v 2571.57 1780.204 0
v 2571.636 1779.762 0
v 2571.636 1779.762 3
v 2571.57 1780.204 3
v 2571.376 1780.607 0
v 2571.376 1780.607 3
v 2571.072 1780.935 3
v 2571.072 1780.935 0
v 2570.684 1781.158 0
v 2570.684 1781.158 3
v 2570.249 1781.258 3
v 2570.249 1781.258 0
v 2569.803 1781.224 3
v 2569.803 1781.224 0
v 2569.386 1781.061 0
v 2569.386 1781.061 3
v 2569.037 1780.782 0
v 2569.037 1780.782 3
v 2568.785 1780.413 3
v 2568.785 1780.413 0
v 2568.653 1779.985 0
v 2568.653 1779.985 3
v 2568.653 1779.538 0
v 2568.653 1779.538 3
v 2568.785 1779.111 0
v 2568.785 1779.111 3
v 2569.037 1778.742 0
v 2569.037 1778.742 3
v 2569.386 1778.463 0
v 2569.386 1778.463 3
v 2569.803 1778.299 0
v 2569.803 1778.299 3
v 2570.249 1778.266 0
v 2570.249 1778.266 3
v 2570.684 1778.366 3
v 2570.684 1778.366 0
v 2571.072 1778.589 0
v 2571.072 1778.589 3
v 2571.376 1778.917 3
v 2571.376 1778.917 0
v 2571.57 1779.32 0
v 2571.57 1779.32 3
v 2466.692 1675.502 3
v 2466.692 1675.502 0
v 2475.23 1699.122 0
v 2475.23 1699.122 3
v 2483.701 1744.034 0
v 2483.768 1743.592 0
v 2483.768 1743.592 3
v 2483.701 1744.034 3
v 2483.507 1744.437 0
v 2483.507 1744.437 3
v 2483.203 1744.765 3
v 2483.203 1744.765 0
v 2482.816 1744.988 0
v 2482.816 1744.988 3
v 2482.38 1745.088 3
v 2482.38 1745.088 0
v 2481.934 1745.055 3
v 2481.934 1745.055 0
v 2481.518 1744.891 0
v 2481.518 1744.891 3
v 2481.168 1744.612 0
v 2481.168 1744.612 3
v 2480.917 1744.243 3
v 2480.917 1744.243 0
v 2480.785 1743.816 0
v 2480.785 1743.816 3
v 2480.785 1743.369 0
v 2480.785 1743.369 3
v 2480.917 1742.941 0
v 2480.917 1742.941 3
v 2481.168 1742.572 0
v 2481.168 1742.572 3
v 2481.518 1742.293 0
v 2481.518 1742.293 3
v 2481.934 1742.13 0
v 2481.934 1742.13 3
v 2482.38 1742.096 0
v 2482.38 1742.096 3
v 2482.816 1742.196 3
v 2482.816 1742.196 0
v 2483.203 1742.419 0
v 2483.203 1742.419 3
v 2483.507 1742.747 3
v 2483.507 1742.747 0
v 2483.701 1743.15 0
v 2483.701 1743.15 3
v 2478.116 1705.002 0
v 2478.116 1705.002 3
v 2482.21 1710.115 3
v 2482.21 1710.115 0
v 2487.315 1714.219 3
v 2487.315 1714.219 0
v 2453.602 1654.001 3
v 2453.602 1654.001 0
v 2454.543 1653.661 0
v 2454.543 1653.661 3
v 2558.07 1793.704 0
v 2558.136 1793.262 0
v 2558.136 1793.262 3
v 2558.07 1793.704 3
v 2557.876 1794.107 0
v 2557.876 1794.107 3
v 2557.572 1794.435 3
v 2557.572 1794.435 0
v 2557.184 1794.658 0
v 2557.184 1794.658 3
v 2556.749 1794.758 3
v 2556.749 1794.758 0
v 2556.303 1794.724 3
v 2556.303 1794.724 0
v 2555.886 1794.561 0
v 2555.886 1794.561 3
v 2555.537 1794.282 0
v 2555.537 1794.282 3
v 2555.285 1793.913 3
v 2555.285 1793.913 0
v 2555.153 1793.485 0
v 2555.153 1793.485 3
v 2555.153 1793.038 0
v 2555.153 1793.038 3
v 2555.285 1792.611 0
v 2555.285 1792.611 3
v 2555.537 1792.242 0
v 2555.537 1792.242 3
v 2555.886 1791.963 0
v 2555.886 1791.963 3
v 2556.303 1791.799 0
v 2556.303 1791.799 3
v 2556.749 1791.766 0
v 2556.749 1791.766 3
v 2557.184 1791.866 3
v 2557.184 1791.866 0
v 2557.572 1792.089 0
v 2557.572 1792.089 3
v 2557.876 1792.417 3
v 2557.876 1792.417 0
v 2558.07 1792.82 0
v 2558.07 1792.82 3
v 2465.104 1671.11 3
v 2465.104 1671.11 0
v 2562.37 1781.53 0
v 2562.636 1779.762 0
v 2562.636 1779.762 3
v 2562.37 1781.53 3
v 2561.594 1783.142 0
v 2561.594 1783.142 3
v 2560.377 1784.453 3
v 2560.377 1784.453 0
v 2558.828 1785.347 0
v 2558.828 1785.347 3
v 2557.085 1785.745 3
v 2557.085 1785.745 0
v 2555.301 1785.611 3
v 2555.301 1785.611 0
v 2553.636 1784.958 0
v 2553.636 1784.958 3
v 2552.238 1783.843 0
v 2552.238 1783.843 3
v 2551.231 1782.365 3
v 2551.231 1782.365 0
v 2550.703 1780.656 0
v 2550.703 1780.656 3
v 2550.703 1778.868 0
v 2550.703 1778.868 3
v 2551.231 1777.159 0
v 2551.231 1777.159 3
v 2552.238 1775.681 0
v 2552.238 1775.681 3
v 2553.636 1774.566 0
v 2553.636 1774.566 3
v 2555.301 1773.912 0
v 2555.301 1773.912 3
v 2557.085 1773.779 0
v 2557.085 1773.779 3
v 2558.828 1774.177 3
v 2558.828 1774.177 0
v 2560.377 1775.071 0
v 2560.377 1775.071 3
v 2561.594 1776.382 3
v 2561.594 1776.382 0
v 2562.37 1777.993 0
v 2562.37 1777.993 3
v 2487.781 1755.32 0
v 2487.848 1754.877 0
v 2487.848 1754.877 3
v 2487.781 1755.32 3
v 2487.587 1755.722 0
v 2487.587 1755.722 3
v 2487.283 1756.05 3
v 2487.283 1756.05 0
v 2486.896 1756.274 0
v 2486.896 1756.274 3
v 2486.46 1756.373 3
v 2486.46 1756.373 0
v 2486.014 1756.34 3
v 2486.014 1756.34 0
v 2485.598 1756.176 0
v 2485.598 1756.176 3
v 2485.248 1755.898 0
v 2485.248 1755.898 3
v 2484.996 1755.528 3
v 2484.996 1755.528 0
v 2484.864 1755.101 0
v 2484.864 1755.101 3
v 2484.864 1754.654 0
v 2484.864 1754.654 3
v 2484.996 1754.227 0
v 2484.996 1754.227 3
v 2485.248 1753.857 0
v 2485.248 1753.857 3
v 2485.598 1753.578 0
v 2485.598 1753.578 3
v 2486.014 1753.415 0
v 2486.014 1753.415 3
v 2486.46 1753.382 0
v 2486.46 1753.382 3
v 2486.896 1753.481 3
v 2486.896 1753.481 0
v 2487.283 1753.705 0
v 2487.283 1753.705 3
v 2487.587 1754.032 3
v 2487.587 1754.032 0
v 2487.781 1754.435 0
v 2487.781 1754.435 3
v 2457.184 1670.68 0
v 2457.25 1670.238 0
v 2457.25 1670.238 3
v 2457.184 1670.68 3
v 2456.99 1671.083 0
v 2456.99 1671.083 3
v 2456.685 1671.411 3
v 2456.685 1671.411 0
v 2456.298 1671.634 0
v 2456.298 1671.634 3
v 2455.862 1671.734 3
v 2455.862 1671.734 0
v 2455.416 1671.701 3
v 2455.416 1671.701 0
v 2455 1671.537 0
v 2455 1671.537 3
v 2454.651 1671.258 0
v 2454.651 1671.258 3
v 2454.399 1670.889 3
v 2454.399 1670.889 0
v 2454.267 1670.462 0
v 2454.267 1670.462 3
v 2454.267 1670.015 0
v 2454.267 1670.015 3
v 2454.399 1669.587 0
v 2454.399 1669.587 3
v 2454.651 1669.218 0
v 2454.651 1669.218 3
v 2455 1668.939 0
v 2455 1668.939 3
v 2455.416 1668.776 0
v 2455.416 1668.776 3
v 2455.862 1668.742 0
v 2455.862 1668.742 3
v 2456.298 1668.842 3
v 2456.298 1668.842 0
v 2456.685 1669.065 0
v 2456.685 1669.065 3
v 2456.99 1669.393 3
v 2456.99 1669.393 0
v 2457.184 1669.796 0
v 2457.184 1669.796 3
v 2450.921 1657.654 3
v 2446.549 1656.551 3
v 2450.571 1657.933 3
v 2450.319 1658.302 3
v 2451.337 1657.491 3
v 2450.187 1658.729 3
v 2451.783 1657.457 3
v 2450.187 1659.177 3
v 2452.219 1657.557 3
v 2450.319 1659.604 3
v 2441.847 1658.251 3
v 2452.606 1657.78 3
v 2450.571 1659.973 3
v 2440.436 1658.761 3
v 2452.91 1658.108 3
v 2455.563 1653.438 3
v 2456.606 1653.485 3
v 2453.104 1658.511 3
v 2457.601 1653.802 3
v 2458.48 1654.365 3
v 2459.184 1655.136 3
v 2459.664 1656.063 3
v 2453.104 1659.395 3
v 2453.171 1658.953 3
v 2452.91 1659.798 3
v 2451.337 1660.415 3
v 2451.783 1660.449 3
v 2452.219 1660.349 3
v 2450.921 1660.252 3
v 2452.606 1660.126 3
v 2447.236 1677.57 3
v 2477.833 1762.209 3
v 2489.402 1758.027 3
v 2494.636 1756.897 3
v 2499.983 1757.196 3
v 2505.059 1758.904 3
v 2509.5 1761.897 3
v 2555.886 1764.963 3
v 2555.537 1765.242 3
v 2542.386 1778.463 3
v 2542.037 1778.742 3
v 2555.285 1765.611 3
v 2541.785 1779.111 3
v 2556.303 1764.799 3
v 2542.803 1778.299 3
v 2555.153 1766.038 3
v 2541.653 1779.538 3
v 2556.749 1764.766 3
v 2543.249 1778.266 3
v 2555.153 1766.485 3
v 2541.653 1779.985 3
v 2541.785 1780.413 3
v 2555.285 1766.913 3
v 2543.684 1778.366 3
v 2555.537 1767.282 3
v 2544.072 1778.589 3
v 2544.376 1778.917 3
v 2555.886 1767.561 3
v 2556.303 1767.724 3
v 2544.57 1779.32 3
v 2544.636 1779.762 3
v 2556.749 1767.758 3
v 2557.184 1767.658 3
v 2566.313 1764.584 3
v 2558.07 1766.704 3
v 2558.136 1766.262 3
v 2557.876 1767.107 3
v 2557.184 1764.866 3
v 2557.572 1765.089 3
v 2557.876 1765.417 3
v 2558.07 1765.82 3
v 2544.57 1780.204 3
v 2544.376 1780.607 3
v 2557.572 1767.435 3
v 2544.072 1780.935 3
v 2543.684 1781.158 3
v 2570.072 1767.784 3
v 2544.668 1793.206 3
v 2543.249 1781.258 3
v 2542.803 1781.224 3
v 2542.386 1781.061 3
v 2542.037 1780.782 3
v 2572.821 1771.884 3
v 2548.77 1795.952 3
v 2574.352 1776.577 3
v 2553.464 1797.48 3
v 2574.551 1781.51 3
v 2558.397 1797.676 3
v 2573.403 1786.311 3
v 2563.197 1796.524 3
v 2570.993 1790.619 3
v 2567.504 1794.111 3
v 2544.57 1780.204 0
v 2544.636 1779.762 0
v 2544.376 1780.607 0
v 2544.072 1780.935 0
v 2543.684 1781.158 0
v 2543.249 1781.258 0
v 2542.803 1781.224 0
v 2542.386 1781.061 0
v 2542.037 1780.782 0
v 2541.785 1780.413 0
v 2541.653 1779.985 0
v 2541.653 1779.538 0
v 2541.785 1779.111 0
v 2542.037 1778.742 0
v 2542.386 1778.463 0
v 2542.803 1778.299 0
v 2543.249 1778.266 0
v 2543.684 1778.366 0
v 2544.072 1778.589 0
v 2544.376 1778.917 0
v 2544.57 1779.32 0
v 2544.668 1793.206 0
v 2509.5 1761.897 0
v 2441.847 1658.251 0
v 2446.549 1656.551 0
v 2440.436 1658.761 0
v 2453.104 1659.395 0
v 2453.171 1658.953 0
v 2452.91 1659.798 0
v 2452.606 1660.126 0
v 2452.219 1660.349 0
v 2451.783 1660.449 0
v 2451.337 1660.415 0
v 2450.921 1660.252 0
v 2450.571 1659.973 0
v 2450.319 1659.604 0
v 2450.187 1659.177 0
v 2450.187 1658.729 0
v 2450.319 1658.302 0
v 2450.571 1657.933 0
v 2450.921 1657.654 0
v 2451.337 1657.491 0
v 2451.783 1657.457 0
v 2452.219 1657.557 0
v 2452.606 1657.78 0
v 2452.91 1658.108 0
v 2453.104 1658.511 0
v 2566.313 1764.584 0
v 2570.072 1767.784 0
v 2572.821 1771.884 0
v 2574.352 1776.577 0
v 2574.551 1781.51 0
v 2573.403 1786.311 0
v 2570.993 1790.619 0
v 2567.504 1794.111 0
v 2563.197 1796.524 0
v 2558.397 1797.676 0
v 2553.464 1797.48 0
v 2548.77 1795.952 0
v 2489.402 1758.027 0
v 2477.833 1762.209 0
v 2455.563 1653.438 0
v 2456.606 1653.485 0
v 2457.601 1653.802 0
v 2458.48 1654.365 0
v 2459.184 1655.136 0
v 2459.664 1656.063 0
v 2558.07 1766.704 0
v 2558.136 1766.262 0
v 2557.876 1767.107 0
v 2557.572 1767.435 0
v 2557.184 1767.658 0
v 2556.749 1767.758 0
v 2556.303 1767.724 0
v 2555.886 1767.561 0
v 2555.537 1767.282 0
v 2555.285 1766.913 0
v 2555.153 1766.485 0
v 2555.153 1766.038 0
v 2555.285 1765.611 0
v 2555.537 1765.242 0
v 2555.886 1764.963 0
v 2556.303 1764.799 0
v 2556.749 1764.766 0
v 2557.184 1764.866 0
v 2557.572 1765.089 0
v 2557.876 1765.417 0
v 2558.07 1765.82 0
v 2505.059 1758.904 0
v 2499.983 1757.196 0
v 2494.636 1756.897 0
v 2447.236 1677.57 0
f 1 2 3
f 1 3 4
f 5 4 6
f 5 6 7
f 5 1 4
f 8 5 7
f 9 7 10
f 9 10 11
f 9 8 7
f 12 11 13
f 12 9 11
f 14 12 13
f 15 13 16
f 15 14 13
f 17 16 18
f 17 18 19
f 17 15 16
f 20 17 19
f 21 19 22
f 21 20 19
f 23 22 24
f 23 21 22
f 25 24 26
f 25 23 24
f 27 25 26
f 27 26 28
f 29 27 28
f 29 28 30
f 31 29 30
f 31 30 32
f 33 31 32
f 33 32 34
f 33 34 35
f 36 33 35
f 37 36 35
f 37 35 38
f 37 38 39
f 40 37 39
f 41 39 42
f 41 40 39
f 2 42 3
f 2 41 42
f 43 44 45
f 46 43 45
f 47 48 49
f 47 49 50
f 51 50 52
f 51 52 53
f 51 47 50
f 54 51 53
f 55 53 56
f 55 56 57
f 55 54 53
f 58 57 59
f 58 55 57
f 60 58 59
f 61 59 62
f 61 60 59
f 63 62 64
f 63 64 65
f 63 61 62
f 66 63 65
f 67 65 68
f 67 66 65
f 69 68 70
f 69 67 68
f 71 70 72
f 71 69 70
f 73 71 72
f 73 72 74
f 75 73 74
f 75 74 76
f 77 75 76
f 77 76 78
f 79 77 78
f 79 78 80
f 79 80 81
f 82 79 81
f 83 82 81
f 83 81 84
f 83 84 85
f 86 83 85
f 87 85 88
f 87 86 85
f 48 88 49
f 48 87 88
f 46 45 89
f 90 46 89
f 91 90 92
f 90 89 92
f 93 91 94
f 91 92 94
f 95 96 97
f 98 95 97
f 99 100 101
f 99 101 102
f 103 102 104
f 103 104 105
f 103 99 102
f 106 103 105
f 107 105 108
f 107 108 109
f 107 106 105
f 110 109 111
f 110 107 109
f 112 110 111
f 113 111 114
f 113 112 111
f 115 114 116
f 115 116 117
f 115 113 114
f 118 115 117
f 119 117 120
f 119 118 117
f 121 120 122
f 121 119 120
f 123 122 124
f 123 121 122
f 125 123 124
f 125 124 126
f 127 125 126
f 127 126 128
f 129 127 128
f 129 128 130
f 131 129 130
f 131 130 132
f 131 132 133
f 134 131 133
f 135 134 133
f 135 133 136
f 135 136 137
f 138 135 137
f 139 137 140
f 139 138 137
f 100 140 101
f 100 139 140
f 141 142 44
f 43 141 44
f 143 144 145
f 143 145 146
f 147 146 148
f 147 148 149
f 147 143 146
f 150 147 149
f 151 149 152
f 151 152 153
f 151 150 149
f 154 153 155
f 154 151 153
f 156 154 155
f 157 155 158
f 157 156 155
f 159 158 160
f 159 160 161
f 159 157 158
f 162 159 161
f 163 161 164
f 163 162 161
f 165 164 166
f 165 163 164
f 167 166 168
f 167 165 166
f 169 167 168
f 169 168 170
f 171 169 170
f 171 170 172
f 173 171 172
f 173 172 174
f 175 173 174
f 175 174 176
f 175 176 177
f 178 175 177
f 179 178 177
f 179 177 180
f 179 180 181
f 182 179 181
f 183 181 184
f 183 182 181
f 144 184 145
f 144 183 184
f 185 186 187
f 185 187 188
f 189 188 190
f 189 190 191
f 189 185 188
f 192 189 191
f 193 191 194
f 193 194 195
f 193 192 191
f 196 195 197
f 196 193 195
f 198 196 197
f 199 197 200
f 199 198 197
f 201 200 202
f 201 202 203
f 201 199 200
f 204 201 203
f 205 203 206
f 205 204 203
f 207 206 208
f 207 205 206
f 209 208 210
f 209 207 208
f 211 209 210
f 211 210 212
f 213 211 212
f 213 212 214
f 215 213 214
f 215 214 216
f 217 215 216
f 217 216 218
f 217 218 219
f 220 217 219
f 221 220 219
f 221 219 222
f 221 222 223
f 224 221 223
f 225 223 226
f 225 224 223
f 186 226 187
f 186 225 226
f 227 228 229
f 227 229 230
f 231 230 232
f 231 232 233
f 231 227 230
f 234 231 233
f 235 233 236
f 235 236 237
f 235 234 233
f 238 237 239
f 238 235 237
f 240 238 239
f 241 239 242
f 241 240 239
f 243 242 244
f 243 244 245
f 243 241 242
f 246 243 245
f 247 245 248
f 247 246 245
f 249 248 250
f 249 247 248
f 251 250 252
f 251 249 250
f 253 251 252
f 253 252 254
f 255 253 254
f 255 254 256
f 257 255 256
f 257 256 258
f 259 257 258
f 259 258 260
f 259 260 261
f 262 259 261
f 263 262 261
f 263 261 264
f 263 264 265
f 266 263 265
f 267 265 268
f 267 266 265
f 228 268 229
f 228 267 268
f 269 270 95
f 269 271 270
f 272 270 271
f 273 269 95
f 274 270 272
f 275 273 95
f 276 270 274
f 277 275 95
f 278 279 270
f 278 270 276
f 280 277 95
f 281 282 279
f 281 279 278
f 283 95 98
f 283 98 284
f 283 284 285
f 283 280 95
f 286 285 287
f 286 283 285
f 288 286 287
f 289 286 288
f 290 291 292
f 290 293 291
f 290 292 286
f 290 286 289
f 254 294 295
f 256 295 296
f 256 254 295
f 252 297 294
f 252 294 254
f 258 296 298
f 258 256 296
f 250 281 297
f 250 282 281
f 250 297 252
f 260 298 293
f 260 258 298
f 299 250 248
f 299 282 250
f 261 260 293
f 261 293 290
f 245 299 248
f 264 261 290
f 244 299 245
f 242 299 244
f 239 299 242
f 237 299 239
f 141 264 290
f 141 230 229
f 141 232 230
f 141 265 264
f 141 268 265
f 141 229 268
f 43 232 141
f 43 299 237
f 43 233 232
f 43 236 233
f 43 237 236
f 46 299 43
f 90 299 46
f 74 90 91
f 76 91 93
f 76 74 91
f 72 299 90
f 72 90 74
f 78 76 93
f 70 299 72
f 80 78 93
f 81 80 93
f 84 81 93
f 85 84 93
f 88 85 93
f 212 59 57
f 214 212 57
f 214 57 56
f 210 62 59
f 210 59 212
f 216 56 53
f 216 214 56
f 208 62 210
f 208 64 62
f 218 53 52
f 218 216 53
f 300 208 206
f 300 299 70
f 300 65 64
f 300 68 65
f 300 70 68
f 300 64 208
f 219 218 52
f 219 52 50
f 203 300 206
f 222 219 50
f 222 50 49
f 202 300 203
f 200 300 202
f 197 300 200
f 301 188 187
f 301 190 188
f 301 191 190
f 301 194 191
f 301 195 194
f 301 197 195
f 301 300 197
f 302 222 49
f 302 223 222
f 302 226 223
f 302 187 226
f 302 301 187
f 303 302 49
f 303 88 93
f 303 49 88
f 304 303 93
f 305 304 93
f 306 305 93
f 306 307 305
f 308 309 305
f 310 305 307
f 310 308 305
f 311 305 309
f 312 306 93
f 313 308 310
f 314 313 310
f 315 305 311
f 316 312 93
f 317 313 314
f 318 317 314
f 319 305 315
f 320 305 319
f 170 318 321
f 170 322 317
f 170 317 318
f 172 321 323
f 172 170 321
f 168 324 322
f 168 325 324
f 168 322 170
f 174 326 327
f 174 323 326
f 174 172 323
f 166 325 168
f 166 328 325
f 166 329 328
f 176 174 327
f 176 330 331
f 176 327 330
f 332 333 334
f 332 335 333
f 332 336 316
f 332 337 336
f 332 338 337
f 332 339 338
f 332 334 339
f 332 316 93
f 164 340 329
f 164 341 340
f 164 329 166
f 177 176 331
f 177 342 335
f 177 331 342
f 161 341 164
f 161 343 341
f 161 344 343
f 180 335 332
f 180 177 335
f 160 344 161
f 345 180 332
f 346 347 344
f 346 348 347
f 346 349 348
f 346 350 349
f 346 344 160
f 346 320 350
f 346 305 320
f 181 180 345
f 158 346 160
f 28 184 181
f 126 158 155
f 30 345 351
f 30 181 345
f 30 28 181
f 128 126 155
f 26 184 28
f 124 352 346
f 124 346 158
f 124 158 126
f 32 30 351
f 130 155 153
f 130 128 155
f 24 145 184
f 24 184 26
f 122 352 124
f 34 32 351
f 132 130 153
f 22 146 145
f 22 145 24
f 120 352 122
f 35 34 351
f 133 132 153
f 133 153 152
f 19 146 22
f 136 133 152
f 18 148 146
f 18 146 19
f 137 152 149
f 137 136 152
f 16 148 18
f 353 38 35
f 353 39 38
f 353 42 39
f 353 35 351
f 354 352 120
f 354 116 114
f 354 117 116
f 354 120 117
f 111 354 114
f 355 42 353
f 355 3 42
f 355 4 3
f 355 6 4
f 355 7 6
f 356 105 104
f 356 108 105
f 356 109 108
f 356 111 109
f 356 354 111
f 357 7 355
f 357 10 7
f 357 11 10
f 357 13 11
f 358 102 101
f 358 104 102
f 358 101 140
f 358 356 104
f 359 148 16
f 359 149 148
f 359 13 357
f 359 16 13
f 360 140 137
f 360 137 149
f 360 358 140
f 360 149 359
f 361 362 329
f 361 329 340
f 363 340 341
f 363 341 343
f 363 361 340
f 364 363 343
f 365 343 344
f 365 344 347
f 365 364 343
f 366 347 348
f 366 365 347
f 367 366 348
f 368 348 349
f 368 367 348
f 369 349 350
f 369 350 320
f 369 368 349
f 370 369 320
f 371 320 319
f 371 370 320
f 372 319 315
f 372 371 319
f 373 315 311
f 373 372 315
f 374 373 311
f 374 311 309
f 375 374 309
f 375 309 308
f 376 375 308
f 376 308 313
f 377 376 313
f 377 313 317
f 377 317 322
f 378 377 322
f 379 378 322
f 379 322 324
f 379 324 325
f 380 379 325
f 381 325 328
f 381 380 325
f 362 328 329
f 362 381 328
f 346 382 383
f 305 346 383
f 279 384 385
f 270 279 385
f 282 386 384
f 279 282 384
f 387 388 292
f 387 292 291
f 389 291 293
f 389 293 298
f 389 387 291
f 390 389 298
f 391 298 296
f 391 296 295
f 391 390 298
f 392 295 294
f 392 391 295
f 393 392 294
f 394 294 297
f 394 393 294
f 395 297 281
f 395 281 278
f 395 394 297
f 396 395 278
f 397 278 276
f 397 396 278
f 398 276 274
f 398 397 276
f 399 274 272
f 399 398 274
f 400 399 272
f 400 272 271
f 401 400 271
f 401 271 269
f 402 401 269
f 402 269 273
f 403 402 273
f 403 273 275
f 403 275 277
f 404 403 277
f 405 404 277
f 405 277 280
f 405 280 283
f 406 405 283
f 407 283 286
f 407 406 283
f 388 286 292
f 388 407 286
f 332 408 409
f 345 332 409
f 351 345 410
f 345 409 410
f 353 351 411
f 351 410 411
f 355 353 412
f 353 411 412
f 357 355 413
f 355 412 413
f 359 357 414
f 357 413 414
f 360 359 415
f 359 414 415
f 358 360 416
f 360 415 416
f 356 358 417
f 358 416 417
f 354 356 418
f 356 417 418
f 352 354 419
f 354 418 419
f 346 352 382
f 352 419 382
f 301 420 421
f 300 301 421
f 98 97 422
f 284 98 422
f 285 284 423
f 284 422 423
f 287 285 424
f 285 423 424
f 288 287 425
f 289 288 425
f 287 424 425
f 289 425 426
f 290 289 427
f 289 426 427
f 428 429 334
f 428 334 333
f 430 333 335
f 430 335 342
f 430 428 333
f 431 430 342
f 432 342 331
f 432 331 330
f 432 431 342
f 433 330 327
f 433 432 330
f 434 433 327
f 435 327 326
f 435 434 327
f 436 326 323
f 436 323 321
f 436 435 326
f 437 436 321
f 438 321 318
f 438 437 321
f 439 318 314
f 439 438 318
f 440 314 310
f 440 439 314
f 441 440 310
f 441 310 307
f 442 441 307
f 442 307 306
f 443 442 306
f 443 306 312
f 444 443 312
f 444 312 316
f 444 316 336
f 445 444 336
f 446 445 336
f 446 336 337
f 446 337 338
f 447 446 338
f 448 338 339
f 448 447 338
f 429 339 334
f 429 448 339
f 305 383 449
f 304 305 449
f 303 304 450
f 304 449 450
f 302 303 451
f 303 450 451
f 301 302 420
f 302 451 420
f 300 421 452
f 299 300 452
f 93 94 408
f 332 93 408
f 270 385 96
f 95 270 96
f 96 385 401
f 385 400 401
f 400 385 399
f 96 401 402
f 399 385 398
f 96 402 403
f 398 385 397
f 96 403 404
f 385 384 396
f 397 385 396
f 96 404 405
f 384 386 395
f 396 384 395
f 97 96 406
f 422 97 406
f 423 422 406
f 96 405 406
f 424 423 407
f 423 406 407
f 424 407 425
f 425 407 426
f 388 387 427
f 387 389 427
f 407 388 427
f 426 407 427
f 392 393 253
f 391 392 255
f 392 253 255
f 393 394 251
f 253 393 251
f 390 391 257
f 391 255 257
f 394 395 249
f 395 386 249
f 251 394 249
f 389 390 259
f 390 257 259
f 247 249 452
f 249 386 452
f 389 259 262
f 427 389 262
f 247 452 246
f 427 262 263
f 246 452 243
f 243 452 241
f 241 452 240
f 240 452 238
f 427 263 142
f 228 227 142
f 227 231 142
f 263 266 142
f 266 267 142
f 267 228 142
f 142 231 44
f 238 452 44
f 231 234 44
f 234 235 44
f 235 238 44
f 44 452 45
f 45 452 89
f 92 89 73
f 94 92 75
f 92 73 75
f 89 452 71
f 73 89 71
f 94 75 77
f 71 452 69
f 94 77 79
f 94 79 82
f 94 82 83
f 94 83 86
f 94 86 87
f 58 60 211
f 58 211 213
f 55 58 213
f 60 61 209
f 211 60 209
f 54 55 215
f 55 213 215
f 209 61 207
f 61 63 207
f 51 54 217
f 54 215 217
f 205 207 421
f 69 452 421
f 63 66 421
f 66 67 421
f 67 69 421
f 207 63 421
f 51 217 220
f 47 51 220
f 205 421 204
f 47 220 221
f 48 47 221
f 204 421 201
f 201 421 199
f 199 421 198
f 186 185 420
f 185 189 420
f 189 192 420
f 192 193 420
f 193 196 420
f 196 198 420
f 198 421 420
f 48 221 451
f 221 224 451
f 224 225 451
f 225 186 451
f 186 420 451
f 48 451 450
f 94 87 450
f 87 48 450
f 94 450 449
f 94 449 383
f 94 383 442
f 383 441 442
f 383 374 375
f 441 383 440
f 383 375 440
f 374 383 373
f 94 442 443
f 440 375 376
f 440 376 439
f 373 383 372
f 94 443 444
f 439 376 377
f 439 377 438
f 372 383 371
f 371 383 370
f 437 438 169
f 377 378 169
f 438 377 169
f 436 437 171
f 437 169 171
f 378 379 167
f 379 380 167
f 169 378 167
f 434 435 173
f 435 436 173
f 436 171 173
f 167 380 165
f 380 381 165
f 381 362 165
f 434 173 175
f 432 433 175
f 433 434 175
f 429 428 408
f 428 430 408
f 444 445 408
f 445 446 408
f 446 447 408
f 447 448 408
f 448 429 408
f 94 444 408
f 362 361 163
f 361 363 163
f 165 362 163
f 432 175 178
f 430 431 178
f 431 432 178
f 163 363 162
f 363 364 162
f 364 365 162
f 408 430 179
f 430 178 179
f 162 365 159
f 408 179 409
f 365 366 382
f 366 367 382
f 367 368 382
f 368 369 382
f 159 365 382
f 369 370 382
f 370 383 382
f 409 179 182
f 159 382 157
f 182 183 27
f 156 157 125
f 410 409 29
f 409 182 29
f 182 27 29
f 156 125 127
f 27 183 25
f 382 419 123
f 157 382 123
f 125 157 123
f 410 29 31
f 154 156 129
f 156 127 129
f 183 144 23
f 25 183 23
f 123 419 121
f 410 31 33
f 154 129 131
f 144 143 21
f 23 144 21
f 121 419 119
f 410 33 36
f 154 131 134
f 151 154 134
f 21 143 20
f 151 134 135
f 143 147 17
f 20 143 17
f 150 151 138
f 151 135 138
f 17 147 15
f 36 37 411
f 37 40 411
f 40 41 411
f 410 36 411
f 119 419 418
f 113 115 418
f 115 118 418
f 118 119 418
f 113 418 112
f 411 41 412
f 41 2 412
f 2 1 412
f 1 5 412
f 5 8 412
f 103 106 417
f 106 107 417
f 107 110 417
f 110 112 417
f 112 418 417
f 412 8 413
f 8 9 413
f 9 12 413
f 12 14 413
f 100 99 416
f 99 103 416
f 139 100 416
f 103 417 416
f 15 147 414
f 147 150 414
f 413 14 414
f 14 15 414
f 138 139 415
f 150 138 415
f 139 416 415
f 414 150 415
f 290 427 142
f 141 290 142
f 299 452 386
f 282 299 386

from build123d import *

# Parameters (mm, degrees)
MODEL_R         = 1.5
MODEL_R_2       = 6
EXTRUDE_1_DEPTH = 3


with BuildPart() as part:
    # Model → 凸台-拉伸1 (new body)
    with BuildSketch(Plane.XY):
        with BuildLine():
            Line((2489.401518441, 1758.026761836), (2477.832923788, 1762.20884815))
            Line((2477.832923788, 1762.20884815), (2447.235551014, 1677.569609145))
            Line((2447.235551014, 1677.569609145), (2443.835842928, 1668.165249256))
            Line((2443.835842928, 1668.165249256), (2440.436134842, 1658.760889367))
            Line((2440.436134842, 1658.760889367), (2441.846788825, 1658.250933154))
            Line((2441.846788825, 1658.250933154), (2446.54896877, 1656.551079111))
            Line((2446.54896877, 1656.551079111), (2453.602238687, 1654.001298046))
            Line((2453.602238687, 1654.001298046), (2454.542674676, 1653.661327237))
            ThreePointArc((2454.542674676, 1653.661327237), (2457.600929914, 1653.801533876), (2459.664301866, 1656.063187959))
            Line((2459.664301866, 1656.063187959), (2465.103834804, 1671.110163782))
            Line((2465.103834804, 1671.110163782), (2466.691626019, 1675.502352652))
            Line((2466.691626019, 1675.502352652), (2475.230094166, 1699.121682704))
            ThreePointArc((2475.230094166, 1699.121682704), (2480.022947289, 1707.670704716), (2487.315446875, 1714.218732526))
            Line((2487.315446875, 1714.218732526), (2566.313045726, 1764.584123777))
            ThreePointArc((2566.313045726, 1764.584123777), (2570.993188824, 1790.619216903), (2544.66757117, 1793.206042885))
            Line((2544.66757117, 1793.206042885), (2509.499643925, 1761.897465327))
            ThreePointArc((2509.499643925, 1761.897465327), (2499.983234073, 1757.196382583), (2489.401518441, 1758.026761836))
        make_face()
        with Locations((2451.67059596, 1658.952939832)):
            Circle(MODEL_R, mode=Mode.SUBTRACT)
        with Locations((2455.750245663, 1670.238171699)):
            Circle(MODEL_R, mode=Mode.SUBTRACT)
        with Locations((2482.267968734, 1743.592178837)):
            Circle(MODEL_R, mode=Mode.SUBTRACT)
        with Locations((2486.347618438, 1754.877410704)):
            Circle(MODEL_R, mode=Mode.SUBTRACT)
        with Locations((2556.636409551, 1766.261828225)):
            Circle(MODEL_R, mode=Mode.SUBTRACT)
        with Locations((2543.136409551, 1779.761828225)):
            Circle(MODEL_R, mode=Mode.SUBTRACT)
        with Locations((2556.636409551, 1779.761828225)):
            Circle(MODEL_R_2, mode=Mode.SUBTRACT)
        with Locations((2556.636409551, 1793.261828225)):
            Circle(MODEL_R, mode=Mode.SUBTRACT)
        with Locations((2570.136409551, 1779.761828225)):
            Circle(MODEL_R, mode=Mode.SUBTRACT)
    extrude(amount=EXTRUDE_1_DEPTH)


solid = part.part
